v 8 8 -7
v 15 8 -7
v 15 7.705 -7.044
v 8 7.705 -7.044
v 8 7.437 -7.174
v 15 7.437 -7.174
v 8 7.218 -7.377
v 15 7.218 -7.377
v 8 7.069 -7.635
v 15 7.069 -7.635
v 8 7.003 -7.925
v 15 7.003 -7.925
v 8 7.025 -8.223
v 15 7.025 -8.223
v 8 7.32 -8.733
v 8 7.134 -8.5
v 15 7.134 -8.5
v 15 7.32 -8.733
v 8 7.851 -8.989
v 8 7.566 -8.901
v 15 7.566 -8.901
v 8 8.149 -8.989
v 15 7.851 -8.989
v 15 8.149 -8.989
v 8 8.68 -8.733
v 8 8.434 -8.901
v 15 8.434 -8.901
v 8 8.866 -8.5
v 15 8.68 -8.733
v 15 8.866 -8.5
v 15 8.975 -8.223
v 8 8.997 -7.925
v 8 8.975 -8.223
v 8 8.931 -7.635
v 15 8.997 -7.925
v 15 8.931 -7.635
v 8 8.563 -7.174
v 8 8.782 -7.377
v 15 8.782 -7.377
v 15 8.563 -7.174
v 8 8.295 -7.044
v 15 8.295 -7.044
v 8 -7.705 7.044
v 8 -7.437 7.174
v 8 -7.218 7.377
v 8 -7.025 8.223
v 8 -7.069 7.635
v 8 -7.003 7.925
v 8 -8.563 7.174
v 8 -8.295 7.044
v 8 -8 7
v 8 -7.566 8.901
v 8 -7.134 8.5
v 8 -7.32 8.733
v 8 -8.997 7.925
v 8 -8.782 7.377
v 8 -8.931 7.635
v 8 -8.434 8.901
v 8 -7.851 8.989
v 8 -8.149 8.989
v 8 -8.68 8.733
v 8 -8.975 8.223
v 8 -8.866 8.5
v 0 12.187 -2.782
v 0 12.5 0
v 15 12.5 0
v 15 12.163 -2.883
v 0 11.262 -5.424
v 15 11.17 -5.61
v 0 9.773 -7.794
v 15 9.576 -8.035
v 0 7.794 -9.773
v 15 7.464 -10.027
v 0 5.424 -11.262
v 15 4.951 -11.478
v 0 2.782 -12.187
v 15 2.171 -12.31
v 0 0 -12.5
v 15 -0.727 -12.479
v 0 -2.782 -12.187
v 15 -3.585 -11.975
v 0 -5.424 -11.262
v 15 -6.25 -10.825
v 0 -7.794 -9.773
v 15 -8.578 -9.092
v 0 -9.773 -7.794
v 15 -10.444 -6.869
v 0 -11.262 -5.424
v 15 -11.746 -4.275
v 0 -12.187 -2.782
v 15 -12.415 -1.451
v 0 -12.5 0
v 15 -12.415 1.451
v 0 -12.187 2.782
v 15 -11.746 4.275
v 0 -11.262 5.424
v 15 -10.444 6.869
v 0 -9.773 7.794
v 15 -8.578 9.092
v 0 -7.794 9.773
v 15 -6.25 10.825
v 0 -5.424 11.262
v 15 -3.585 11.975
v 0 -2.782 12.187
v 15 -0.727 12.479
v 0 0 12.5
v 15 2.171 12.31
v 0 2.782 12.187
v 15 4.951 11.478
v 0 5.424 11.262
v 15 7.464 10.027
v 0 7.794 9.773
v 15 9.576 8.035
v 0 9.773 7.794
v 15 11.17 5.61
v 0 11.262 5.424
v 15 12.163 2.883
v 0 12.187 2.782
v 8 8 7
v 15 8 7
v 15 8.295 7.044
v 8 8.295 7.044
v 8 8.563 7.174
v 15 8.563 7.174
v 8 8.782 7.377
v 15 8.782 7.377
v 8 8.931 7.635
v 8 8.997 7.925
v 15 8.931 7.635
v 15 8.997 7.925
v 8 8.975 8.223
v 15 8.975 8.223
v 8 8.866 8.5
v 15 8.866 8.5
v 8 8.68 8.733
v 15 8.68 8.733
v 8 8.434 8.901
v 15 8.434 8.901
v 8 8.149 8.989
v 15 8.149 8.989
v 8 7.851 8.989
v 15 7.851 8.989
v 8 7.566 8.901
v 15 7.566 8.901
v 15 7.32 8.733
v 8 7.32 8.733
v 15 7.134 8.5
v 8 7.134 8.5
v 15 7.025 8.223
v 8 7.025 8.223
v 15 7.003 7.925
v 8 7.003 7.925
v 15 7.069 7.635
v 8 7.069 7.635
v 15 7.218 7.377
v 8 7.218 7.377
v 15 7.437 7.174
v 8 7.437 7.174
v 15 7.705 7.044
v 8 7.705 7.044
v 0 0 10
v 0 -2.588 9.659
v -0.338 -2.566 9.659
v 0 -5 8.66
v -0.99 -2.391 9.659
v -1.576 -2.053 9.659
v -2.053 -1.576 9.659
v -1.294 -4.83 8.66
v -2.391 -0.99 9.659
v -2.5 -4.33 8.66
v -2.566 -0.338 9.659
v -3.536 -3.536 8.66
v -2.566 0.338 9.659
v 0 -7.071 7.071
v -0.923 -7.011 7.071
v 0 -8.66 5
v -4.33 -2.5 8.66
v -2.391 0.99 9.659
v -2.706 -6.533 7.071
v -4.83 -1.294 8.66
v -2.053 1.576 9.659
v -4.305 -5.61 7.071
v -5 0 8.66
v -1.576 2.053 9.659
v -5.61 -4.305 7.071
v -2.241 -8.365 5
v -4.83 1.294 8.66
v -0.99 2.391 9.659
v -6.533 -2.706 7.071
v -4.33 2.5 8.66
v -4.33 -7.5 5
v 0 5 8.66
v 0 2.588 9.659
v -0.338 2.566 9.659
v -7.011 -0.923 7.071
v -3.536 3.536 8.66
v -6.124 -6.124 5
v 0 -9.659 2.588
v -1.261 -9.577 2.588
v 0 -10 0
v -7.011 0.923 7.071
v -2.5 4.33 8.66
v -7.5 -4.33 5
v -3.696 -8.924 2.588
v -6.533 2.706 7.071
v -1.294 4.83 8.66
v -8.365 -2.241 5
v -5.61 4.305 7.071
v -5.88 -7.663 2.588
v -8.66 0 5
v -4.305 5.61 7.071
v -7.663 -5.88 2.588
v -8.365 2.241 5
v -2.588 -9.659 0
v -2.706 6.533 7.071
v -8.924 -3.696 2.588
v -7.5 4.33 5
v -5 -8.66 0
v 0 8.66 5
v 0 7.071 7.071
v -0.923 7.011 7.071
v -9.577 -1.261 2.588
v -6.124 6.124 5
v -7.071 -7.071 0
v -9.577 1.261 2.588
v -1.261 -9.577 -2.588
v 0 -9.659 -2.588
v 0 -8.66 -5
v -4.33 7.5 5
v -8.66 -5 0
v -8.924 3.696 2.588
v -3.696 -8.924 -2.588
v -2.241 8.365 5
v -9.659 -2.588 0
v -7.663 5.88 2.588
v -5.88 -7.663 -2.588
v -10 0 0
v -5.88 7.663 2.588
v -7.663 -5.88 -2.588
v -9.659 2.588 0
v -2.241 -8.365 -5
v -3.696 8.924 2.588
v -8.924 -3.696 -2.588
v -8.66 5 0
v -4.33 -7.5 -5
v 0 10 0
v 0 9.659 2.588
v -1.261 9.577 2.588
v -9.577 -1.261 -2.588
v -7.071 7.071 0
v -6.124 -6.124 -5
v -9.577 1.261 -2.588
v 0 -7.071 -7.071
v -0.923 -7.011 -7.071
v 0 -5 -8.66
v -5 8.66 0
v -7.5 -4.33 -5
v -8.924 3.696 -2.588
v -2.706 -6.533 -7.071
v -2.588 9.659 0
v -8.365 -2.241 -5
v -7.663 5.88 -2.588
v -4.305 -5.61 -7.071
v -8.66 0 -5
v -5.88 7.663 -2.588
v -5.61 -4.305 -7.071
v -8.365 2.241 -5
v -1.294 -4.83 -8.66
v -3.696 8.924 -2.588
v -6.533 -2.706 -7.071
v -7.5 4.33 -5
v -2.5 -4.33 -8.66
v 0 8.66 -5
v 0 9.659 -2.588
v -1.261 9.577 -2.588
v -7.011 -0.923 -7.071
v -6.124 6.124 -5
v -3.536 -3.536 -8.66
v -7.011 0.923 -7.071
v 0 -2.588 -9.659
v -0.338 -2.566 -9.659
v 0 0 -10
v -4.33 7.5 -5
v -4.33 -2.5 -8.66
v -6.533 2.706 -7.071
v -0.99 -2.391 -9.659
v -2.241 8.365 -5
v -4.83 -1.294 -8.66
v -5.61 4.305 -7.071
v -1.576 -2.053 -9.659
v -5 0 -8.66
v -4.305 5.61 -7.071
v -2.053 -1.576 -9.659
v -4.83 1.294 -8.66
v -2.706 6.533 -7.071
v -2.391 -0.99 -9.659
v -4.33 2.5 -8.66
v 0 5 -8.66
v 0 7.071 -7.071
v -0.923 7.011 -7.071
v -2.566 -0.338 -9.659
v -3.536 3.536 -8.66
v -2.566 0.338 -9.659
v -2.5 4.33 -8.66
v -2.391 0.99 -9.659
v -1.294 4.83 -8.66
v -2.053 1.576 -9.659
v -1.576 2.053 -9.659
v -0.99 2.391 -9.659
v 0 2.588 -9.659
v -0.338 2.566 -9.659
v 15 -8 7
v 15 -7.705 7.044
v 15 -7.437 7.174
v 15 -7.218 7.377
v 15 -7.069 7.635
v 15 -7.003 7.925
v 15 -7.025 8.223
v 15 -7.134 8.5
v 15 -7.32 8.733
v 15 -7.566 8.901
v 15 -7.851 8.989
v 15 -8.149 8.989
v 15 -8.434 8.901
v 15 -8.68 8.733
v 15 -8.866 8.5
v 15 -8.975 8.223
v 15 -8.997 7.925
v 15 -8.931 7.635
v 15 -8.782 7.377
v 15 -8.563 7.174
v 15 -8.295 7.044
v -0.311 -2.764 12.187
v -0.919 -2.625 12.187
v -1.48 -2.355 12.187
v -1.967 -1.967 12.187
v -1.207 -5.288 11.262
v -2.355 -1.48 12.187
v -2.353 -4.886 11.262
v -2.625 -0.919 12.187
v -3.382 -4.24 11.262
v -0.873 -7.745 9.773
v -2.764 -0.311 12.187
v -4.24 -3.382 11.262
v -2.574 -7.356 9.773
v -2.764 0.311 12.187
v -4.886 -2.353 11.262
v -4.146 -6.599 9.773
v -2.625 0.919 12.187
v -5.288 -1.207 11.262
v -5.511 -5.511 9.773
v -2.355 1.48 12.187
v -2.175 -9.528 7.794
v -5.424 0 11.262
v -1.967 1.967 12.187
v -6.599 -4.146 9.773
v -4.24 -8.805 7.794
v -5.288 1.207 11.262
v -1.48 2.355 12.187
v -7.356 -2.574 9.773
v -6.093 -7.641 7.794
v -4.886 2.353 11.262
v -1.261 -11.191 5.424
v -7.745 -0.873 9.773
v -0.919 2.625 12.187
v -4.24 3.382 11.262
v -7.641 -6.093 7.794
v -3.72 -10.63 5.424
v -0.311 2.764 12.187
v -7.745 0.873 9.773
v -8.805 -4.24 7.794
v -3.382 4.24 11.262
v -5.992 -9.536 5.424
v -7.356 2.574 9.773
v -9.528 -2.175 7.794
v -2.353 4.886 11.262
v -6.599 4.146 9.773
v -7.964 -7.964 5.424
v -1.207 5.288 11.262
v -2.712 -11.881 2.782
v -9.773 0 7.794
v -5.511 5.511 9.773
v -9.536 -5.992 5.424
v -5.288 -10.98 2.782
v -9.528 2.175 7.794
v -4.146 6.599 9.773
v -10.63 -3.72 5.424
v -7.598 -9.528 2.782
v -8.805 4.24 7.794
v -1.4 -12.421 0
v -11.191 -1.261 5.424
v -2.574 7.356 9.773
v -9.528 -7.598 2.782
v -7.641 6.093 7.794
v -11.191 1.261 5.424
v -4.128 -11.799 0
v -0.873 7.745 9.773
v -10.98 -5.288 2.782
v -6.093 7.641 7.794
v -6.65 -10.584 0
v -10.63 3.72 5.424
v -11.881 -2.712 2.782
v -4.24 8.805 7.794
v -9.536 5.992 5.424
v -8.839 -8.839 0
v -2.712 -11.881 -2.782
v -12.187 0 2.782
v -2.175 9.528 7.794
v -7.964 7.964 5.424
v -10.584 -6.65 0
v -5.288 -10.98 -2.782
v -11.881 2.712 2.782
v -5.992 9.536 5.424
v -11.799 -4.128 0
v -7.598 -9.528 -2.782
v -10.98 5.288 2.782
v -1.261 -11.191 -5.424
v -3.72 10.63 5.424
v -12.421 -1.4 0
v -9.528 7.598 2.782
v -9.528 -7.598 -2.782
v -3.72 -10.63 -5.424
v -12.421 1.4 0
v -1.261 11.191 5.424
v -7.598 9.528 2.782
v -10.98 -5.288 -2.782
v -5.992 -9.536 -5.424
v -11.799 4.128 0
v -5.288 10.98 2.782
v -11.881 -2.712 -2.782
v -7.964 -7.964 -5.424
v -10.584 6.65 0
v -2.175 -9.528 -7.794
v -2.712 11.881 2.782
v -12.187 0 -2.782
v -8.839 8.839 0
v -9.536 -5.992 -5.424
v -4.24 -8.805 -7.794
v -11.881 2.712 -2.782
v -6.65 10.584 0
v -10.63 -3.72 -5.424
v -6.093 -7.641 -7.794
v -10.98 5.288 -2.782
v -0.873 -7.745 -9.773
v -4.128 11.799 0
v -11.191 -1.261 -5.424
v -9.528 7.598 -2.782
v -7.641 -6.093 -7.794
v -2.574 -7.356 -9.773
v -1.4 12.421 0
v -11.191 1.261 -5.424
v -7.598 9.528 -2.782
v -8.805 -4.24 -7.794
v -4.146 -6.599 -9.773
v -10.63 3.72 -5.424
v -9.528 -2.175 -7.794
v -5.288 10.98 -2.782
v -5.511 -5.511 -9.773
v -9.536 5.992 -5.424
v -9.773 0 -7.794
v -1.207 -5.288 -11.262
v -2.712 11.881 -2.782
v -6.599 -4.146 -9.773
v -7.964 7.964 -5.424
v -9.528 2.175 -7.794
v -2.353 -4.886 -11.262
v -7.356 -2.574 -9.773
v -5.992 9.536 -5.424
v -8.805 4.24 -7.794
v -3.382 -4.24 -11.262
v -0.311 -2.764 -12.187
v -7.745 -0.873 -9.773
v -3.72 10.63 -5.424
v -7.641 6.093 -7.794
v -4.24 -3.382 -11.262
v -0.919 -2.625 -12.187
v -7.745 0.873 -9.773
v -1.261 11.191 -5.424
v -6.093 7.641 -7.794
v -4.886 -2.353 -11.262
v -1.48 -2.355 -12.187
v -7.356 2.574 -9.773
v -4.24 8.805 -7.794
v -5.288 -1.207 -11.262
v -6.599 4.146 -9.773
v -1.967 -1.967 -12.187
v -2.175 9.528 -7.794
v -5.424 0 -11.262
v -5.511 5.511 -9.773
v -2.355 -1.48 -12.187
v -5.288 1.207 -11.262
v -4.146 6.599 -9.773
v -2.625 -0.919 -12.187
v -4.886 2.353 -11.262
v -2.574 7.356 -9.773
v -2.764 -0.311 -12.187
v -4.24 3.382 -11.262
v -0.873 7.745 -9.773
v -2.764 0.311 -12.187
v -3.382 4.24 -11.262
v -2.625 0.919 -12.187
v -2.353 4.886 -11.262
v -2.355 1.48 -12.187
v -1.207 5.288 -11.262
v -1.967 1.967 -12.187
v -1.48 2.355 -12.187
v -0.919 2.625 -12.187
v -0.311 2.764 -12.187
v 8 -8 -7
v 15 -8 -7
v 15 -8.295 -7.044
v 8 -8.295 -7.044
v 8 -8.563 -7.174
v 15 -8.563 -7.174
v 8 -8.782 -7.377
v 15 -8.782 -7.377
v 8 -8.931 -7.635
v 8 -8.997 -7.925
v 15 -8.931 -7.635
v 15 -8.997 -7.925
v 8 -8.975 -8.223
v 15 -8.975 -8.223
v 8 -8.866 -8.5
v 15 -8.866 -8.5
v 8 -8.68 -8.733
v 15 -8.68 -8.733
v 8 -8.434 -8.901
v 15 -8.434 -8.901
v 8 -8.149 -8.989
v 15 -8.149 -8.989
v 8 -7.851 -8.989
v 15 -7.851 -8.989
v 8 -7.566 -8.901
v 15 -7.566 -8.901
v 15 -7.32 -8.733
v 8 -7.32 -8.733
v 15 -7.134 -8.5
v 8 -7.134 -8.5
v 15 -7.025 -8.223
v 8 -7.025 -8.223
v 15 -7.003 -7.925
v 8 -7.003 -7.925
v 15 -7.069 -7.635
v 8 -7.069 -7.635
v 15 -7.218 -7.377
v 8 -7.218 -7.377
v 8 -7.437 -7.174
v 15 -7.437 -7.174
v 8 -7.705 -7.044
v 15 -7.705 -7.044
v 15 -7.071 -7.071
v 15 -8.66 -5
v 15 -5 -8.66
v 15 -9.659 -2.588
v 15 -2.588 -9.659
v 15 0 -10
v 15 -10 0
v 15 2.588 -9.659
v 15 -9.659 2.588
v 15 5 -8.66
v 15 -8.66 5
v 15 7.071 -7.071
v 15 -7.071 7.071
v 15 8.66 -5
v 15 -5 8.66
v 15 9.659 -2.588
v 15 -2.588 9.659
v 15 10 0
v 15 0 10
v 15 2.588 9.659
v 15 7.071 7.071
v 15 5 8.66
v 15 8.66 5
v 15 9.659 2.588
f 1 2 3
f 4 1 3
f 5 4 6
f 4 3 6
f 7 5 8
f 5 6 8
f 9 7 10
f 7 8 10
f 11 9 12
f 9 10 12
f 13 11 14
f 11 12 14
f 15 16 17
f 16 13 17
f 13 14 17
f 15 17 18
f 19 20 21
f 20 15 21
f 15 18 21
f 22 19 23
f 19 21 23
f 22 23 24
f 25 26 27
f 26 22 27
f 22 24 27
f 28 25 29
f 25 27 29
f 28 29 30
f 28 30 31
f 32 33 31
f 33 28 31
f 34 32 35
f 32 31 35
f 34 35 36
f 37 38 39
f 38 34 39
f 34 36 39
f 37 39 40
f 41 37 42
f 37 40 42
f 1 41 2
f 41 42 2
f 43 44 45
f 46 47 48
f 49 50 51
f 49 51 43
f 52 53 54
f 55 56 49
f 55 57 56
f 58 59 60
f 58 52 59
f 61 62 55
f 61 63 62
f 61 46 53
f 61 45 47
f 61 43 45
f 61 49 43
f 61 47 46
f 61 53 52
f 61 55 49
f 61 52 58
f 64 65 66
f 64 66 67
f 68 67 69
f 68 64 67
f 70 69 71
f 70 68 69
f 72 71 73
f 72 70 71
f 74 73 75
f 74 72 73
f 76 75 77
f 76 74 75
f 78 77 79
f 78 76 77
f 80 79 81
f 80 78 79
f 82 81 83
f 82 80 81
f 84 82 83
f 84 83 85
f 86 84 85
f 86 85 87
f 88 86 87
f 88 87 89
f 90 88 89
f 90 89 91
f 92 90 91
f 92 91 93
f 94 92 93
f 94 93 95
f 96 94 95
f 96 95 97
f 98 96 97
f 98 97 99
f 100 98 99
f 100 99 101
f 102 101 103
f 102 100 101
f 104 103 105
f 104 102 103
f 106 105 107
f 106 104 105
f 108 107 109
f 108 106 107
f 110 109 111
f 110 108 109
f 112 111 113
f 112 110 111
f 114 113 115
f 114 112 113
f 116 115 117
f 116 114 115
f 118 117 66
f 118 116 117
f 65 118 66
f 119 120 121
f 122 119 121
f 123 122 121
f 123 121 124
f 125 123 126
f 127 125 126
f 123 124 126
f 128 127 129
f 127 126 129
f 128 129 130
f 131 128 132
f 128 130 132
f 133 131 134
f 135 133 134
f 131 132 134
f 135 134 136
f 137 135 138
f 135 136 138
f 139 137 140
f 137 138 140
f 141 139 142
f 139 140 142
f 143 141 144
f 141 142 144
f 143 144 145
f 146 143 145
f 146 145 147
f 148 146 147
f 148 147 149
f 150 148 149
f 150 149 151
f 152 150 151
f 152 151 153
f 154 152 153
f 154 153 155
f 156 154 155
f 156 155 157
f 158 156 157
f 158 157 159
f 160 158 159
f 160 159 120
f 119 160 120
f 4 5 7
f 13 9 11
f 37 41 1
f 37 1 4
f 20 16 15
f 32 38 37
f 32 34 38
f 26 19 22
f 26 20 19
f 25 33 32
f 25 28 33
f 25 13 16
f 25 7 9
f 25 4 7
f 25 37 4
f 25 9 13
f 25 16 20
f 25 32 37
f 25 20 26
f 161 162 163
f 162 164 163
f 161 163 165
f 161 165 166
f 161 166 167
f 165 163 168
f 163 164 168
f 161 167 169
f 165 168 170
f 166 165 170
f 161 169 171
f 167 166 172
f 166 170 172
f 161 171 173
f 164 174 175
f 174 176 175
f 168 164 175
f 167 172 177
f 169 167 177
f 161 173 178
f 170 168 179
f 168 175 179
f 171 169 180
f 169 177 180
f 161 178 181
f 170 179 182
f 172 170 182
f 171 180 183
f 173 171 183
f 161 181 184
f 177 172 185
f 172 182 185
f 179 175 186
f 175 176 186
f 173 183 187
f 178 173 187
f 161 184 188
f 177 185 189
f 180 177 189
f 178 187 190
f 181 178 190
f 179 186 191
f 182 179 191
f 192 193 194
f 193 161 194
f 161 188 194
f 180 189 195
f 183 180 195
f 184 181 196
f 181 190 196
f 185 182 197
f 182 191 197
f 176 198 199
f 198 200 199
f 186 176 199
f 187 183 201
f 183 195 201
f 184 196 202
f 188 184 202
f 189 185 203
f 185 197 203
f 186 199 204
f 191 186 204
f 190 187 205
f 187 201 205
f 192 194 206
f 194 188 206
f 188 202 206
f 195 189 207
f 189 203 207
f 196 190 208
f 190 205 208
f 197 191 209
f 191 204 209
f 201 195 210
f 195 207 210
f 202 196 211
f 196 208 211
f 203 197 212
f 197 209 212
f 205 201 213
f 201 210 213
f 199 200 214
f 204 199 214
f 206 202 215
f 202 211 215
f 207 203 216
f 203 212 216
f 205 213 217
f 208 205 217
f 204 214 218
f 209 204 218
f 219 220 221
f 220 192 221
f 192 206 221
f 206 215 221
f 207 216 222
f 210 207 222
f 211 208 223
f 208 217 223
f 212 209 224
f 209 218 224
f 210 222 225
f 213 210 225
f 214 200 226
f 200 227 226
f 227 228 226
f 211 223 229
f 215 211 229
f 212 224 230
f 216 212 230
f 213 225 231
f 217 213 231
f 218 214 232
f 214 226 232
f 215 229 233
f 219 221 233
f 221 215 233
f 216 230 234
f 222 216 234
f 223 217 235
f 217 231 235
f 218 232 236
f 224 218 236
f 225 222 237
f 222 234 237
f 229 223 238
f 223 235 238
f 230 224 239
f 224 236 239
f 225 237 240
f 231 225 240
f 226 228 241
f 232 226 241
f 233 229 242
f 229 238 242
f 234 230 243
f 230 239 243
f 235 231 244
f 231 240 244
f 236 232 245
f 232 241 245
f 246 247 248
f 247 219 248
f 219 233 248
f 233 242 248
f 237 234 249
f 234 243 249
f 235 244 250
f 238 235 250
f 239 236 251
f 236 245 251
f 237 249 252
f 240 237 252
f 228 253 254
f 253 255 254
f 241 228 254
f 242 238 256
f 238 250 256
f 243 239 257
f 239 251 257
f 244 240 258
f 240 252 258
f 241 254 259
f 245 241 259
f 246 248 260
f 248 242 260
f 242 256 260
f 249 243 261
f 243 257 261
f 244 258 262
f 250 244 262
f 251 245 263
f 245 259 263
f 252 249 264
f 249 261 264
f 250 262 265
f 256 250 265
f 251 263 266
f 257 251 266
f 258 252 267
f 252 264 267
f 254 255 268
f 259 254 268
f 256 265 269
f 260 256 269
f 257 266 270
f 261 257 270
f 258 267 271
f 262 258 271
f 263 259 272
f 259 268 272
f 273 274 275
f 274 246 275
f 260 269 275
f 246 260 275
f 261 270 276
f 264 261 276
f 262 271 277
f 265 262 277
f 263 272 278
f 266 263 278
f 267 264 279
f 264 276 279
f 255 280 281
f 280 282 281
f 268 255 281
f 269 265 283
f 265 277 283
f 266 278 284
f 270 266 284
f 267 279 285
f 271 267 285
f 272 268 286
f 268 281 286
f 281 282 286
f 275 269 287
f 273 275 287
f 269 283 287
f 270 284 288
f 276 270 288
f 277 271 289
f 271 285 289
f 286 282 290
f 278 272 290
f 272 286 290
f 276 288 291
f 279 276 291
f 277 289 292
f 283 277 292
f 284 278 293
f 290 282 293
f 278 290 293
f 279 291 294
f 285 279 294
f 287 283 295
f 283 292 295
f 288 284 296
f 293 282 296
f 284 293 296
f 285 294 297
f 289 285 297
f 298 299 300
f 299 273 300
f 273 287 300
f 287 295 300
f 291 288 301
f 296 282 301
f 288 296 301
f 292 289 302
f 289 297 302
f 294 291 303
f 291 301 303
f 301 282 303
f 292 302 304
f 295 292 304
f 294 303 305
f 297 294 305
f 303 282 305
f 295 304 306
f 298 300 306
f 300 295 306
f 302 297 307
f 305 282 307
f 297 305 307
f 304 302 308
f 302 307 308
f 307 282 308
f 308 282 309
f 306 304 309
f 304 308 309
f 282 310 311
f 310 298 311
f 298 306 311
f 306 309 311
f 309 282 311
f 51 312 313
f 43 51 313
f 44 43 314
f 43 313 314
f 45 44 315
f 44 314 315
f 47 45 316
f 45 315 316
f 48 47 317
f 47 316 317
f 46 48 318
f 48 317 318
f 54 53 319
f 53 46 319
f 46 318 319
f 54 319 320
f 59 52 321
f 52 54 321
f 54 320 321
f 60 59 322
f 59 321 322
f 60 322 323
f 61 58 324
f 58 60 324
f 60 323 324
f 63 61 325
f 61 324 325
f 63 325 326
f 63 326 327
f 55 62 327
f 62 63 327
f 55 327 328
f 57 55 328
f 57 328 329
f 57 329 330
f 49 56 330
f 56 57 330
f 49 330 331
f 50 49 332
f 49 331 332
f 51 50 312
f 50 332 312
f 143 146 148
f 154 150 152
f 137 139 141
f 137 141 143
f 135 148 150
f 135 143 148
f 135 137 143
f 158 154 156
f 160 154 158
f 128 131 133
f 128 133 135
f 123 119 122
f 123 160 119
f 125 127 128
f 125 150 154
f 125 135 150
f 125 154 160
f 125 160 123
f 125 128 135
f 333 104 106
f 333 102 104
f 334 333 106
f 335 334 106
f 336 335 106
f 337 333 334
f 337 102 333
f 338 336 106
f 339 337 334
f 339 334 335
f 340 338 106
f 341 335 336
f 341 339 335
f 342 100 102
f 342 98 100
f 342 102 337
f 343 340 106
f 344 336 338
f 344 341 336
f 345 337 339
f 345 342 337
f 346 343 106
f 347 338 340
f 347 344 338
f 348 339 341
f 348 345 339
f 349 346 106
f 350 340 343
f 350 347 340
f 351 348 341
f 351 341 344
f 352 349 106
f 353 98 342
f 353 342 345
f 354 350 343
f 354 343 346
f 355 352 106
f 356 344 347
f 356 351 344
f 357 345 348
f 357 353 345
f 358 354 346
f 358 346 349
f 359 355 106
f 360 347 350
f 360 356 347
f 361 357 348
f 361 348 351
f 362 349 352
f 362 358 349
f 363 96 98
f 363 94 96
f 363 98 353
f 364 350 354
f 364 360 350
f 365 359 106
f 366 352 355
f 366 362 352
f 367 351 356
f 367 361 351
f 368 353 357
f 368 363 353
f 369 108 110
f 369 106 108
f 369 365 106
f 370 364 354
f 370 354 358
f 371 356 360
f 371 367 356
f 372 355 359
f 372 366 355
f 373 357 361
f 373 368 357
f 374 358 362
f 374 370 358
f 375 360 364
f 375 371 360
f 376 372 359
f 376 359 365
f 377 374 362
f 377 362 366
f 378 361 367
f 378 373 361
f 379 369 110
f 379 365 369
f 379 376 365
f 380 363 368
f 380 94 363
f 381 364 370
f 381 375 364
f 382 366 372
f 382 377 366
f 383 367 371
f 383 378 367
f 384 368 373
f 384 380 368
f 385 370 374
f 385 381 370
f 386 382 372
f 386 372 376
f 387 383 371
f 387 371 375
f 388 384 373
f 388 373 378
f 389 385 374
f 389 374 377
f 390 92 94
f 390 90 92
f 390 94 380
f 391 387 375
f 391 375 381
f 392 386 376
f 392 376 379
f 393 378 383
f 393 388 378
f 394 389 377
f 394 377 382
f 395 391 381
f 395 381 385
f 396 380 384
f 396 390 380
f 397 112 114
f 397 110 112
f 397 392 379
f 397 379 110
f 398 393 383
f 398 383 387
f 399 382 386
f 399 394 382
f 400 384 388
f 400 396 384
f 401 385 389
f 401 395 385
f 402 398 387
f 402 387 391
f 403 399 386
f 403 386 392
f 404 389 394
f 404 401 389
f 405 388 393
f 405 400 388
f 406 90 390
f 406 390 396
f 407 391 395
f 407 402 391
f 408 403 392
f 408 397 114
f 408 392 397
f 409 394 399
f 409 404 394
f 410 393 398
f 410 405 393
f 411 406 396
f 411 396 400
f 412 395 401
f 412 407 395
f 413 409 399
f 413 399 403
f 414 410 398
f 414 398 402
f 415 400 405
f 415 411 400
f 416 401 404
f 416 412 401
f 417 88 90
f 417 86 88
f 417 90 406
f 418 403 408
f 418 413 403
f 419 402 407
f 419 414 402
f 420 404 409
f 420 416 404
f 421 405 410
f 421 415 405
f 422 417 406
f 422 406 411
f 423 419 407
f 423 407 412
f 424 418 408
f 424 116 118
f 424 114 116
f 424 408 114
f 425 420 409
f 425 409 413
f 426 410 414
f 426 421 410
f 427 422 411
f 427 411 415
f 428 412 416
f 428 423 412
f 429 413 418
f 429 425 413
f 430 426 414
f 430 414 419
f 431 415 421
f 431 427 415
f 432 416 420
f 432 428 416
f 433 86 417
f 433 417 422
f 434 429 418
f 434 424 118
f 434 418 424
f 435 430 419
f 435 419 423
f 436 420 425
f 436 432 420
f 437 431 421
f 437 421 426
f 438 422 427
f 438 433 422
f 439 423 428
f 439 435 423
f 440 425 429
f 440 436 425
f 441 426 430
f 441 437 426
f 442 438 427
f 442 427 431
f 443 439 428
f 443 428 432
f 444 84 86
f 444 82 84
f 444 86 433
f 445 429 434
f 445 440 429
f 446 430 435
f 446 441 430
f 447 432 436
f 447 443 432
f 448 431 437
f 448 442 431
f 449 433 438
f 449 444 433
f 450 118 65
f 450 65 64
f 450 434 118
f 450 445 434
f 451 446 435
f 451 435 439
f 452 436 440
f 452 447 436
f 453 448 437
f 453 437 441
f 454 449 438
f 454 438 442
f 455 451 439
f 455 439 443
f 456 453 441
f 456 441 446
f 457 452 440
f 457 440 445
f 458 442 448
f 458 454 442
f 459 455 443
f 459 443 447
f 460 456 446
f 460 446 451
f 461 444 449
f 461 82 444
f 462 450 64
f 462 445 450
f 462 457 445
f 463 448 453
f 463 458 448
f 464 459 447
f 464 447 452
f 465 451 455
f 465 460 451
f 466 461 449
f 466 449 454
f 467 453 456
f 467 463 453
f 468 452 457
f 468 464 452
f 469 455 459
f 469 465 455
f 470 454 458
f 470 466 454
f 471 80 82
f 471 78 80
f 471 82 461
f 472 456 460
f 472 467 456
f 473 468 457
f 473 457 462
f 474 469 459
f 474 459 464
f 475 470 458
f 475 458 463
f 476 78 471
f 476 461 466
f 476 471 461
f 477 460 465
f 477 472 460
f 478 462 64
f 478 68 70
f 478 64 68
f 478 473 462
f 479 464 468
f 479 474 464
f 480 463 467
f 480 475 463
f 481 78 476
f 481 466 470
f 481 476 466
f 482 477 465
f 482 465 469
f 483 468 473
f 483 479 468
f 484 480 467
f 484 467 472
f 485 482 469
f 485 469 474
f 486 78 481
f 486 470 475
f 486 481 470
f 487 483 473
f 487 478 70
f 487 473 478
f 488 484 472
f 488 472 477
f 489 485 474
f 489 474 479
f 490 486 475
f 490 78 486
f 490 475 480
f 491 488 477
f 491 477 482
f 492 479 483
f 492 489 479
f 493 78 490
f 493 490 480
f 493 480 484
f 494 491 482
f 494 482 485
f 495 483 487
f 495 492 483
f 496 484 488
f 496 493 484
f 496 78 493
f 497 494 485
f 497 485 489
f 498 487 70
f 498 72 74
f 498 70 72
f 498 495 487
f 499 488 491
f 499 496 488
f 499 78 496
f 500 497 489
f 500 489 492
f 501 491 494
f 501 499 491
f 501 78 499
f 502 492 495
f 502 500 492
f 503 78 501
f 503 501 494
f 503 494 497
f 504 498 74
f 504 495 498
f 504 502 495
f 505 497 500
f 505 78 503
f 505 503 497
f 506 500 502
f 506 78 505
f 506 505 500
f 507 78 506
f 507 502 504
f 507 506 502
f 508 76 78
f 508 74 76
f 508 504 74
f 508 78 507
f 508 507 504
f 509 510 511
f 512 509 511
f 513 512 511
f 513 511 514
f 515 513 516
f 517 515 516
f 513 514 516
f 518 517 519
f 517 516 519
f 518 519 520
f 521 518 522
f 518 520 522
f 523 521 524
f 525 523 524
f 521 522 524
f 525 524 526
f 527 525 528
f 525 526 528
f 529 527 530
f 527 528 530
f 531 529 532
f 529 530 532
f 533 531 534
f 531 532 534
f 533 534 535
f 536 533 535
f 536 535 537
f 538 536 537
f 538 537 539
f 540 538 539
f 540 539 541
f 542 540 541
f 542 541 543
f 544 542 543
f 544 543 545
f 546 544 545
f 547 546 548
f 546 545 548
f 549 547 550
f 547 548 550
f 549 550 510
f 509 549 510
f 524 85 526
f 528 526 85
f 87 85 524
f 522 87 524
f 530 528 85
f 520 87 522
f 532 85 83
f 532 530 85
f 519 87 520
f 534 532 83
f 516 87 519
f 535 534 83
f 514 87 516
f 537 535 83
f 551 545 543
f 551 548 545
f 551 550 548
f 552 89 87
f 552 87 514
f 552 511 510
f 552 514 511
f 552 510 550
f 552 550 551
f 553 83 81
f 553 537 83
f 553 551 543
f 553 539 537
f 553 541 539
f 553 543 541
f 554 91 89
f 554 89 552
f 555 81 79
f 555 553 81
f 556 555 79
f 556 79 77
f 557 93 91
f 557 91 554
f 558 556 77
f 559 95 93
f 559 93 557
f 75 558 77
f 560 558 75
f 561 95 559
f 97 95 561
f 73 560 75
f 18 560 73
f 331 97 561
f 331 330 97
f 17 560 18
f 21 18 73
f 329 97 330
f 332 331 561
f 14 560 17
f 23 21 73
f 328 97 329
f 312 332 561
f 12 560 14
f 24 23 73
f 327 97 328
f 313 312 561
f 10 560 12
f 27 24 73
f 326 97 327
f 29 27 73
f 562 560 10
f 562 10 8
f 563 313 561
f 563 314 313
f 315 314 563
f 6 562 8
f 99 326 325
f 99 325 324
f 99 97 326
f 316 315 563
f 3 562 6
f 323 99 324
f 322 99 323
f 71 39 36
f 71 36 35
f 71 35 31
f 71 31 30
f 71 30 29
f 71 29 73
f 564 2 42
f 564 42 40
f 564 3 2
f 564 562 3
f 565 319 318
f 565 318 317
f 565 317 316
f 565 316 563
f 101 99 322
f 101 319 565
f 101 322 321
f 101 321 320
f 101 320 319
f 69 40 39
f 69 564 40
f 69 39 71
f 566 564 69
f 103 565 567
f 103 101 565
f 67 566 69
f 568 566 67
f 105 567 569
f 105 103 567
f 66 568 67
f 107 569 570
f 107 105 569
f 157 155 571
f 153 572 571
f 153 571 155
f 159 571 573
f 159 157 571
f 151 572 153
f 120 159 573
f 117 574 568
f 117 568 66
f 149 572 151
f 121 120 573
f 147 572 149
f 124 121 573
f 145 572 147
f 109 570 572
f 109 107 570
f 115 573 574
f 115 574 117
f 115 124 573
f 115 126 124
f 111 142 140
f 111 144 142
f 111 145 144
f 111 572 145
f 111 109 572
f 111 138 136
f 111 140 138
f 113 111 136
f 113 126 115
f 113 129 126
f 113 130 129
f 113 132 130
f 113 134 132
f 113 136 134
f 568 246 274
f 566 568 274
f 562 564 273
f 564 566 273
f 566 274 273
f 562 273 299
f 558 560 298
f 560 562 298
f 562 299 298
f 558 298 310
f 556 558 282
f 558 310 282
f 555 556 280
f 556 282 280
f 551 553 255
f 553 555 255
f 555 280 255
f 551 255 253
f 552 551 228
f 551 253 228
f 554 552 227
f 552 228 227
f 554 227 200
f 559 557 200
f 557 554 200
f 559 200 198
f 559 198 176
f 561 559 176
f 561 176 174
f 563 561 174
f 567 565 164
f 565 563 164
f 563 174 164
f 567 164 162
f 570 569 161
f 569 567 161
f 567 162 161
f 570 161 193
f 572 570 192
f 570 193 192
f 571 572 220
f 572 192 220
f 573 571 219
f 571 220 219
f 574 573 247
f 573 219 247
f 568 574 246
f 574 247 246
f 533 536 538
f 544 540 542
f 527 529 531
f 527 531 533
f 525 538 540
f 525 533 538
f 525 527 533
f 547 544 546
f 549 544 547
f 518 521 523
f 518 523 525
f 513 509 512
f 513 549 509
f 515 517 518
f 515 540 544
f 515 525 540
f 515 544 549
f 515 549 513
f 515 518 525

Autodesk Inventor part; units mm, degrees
ref_plane "YZ Plane" through (0, 0, 0) normal (1, 0, 0) x (0, 1, 0)
ref_plane "XZ Plane" through (0, 0, 0) normal (0, 1, 0) x (-1, 0, 0)
ref_plane "XY Plane" through (0, 0, 0) normal (0, 0, 1) x (1, 0, 0)
sketch "Sketch2" plane through (0, 0, 0) normal (1, 0, 0) x (0, 1, 0)
  circle A0 centre (0, 0) radius 10
  circle A1 centre (0, 0) radius 12.5
  dimension "d3" = 20
  dimension "d4" = 25
extrude "Extrusion1" add sketch "Sketch2" along normal blind 15
sketch "Sketch3" plane through (0, 0, 0) normal (-1, 0, 0) x (0, 0, 1)
  circle A0 centre (0, 0) radius 10 projected
  arc A1 (10, 0) -> (-10, 0) centre (0, 0) ccw
  circle A2 centre (0, 0) radius 12.5 projected
  arc A3 (12.5, 0) -> (-12.5, 0) centre (0, 0) ccw
  line L0 (-12.5, 0) -> (-10, 0)
  line L1 (10, 0) -> (12.5, 0)
revolve "Revolution1" add sketch "Sketch3" angle 180 about axis through (0, 0, 10) along (0, 0, 1) picked at (-11.4487, 1.7949) contours A0 L0 A2 L1
sketch "Sketch5" plane through (15, 0, 0) normal (1, 0, 0) x (0, 0, -1)
  circle A0 centre (-8, 8) radius 1
  point P0 (0, 0)
  dimension "d9" = 2
extrude "Extrusion2" cut sketch "Sketch5" against normal blind 7
mirror "Mirror1" about plane through (0, 0, 0) normal (0, 0, 1) of "Extrusion2"
mirror "Mirror2" about plane through (0, 0, 0) normal (0, 1, 0) of "Extrusion2", "Mirror1"
properties part number "Plasmid Half 2"
